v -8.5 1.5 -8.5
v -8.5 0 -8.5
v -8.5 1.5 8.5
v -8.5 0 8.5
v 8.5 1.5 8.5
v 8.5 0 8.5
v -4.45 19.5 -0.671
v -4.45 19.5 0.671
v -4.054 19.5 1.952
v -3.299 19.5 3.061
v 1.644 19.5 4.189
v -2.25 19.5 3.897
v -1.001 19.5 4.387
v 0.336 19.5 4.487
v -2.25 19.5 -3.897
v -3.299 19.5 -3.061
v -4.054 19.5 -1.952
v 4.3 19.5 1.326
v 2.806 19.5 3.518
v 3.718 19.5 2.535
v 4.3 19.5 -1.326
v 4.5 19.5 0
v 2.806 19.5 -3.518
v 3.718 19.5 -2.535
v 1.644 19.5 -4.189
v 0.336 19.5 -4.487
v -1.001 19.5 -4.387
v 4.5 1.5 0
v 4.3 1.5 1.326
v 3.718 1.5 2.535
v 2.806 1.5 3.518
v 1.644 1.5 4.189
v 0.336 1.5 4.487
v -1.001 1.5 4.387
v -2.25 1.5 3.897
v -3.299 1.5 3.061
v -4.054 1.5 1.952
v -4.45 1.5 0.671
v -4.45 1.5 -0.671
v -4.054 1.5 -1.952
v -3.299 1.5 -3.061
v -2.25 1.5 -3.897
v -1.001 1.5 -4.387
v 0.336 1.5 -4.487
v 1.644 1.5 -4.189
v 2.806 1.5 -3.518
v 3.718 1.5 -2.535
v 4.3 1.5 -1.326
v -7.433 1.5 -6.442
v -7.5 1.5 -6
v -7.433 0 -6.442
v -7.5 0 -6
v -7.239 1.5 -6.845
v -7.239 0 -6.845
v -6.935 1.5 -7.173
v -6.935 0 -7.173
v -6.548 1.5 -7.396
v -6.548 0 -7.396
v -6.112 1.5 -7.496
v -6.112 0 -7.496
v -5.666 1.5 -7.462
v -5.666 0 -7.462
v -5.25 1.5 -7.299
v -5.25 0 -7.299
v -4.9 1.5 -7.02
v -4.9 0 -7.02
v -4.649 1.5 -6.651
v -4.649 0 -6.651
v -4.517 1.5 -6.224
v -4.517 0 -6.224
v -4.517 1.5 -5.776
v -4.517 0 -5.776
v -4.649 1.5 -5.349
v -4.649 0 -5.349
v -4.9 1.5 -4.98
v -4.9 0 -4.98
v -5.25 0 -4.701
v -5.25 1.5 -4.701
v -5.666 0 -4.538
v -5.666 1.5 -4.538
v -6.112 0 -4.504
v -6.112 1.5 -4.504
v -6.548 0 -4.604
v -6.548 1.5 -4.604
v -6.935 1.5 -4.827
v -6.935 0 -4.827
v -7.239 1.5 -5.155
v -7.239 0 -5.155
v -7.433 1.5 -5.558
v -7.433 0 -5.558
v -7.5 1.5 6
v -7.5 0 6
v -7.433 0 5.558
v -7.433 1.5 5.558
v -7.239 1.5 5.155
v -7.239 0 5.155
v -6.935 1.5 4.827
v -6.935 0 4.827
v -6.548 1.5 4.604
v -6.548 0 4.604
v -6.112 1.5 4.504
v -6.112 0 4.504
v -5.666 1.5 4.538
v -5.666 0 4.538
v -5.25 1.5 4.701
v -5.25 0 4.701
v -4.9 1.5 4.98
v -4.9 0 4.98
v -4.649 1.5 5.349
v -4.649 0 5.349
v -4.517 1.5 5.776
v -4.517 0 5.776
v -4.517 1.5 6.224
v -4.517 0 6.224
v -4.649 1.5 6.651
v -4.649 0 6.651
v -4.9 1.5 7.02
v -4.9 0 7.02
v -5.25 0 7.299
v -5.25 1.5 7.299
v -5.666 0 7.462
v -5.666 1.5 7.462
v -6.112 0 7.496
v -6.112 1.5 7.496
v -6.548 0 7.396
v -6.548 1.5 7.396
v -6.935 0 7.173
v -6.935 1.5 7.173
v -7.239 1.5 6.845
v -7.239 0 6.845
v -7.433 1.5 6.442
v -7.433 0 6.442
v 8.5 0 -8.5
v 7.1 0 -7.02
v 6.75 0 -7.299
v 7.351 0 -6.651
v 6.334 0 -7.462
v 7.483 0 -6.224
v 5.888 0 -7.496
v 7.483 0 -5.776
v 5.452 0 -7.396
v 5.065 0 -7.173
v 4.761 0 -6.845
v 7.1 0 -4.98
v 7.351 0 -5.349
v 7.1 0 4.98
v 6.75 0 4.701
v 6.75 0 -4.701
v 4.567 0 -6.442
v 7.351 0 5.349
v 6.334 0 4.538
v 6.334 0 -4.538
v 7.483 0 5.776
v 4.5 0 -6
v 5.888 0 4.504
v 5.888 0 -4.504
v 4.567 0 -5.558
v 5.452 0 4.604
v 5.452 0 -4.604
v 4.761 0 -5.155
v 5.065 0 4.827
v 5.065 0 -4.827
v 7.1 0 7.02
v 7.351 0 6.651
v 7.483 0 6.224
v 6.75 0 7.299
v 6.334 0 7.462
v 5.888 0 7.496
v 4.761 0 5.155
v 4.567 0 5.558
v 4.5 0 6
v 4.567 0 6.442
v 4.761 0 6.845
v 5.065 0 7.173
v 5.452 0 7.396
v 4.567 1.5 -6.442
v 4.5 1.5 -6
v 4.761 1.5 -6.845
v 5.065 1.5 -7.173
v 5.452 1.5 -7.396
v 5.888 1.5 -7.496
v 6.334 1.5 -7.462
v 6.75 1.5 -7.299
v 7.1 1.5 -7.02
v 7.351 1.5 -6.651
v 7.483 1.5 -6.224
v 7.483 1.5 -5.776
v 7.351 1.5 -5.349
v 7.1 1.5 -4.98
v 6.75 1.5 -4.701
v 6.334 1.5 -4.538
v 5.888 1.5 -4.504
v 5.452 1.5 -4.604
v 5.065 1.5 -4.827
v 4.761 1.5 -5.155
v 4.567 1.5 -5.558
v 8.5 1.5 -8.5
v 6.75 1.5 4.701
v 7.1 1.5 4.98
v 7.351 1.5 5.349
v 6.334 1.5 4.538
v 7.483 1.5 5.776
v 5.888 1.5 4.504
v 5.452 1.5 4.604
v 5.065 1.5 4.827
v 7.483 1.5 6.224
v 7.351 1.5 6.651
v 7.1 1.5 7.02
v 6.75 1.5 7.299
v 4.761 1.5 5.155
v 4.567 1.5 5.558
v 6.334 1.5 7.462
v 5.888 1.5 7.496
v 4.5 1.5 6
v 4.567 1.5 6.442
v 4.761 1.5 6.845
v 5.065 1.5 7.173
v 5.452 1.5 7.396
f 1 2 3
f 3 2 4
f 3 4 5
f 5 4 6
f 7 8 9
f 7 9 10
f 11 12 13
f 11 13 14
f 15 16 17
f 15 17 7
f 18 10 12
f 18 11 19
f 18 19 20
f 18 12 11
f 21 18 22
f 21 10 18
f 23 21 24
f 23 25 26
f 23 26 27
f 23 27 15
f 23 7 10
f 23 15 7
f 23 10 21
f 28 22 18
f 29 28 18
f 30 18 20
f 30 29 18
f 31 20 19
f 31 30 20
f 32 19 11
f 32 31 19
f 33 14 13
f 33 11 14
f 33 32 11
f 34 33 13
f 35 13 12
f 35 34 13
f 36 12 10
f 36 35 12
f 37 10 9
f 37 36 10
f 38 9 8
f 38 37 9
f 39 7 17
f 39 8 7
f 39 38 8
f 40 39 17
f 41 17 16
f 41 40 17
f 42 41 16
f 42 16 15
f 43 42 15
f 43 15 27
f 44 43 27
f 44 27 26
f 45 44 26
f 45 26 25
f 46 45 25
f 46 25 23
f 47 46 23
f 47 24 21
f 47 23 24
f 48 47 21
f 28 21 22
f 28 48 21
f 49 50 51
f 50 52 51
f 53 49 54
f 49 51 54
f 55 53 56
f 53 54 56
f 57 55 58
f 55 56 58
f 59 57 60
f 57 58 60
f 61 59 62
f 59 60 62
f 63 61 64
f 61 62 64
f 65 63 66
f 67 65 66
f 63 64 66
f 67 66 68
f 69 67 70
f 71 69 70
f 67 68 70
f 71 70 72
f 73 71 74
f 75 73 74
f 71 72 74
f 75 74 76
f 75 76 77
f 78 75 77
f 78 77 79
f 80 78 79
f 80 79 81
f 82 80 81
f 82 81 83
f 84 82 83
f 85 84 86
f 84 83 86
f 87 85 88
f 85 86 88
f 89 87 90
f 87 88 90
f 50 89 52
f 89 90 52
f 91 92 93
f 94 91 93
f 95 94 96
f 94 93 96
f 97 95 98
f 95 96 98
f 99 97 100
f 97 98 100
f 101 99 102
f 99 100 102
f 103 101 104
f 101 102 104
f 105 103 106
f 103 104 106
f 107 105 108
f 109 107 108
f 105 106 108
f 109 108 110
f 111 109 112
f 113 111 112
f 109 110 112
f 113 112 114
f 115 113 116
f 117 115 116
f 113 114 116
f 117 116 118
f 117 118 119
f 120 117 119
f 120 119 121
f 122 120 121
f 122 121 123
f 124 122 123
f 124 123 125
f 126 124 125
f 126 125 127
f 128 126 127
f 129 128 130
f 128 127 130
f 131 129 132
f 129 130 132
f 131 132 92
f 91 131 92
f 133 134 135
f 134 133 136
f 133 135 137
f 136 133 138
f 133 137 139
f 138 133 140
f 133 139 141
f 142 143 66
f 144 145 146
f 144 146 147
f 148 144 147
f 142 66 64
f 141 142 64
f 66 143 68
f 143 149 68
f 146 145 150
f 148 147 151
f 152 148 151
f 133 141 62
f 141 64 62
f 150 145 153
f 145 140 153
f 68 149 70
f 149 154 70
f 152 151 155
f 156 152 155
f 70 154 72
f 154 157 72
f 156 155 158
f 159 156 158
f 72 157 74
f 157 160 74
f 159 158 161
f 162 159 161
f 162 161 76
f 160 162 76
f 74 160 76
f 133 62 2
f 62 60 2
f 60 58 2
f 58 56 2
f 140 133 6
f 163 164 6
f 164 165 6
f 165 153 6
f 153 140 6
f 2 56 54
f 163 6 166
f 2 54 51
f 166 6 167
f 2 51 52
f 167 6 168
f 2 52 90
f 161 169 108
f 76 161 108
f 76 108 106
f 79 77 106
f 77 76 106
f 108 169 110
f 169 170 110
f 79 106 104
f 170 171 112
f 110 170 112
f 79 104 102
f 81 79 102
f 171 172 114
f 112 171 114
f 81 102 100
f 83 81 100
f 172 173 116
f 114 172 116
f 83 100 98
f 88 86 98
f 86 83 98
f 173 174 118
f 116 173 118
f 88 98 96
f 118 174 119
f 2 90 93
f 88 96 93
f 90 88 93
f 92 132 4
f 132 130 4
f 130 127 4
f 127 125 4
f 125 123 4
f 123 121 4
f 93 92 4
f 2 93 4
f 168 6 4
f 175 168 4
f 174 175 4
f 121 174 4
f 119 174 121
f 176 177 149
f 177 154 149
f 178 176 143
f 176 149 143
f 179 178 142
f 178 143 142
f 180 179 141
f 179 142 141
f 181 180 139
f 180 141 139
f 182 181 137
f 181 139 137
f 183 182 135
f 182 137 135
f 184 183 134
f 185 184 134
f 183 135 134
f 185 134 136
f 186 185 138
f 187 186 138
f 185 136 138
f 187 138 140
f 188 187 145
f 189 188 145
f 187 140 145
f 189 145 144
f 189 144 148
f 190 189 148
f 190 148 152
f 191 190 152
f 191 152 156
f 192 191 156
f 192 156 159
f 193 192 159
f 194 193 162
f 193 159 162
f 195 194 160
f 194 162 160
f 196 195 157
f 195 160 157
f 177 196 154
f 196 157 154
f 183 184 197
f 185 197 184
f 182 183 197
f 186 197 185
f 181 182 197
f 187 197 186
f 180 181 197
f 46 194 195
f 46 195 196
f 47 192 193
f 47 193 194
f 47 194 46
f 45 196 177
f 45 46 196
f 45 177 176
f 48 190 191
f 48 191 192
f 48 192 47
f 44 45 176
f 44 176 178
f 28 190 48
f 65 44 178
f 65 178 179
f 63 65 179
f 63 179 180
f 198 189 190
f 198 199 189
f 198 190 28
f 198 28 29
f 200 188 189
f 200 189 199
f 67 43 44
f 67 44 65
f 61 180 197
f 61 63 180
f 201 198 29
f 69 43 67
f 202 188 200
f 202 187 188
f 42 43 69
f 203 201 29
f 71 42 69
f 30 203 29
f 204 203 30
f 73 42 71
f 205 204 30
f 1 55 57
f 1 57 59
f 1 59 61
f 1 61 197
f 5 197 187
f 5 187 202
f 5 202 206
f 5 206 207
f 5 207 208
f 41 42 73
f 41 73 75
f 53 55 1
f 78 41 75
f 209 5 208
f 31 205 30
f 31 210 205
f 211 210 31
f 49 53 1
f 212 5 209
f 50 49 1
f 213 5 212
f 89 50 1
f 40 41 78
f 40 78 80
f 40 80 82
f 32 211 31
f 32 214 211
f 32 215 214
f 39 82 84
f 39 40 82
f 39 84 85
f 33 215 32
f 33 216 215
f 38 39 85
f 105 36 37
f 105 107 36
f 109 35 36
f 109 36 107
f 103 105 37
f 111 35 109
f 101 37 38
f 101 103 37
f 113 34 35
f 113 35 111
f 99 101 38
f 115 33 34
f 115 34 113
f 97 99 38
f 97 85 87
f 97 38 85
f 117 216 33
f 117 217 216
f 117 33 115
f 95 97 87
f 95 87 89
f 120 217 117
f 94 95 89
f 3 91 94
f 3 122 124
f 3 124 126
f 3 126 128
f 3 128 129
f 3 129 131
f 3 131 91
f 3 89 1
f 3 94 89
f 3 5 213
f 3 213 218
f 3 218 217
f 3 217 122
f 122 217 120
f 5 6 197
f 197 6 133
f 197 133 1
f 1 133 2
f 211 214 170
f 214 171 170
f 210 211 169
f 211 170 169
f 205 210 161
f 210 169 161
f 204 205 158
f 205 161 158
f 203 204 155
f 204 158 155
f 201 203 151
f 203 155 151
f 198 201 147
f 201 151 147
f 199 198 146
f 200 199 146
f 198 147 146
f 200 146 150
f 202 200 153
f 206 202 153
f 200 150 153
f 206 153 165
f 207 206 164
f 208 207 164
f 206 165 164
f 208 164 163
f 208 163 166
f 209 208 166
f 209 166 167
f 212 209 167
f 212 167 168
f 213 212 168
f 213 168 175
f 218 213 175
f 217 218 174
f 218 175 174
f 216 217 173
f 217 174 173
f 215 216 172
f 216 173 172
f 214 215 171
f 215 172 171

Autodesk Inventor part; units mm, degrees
ref_plane "YZ Plane" through (0, 0, 0) normal (1, 0, 0) x (0, 1, 0)
ref_plane "XZ Plane" through (0, 0, 0) normal (0, 1, 0) x (-1, 0, 0)
sketch "Sketch1" plane through (0, 0, 0) normal (0, 1, 0) x (-1, 0, 0)
  line L0 (8.5, 8.5) -> (-8.5, 8.5)
  line L1 (-8.5, 8.5) -> (-8.5, -8.5)
  line L2 (-8.5, -8.5) -> (8.5, -8.5)
  line L3 (8.5, -8.5) -> (8.5, 8.5)
  line L4 (8.5, 8.5) -> (-8.5, -8.5) construction
  line L5 (-8.5, 8.5) -> (8.5, -8.5) construction
  line L6 (6, 6) -> (-6, 6)
  line L7 (-6, 6) -> (-6, -6)
  line L8 (-6, -6) -> (6, -6)
  line L9 (6, -6) -> (6, 6)
  line L10 (6, 6) -> (-6, -6) construction
  line L11 (-6, 6) -> (6, -6) construction
  circle A0 centre (6, 6) radius 1.5
  line L12 (6, 0) -> (4.5, 0)
  line L13 (0, 6) -> (0, 3.3641)
  circle A1 centre (6, -6) radius 1.5
  circle A2 centre (-6, 6) radius 1.5
  circle A3 centre (-6, -6) radius 1.5
  circle A4 centre (0, 0) radius 4.5
  dimension "d0" = 17
  dimension "d1" = 17
  dimension "d2" = 12
  dimension "d3" = 12
  dimension "d4" = 3
  dimension "d5" = 9
extrude "Extrusion1" add sketch "Sketch1" along normal blind 1.5 contours L3 L2 L1 L0 | L13 A4 L12 L9 A1 L8 A3 L7 A2 L6 | L6 A0 L9 L12 A4 L13 | A4
ref_plane "Work Plane1" through (0, 1.5, 0) normal (0, 1, 0) x (1, 0, 0)
sketch "Sketch2" plane through (0, 1.5, 0) normal (0, 1, 0) x (1, 0, 0)
  circle A0 centre (0, 0) radius 4.5
  dimension "d9" = 9
extrude "Extrusion2" add sketch "Sketch2" along normal blind 18
properties part number "BNC connector"
